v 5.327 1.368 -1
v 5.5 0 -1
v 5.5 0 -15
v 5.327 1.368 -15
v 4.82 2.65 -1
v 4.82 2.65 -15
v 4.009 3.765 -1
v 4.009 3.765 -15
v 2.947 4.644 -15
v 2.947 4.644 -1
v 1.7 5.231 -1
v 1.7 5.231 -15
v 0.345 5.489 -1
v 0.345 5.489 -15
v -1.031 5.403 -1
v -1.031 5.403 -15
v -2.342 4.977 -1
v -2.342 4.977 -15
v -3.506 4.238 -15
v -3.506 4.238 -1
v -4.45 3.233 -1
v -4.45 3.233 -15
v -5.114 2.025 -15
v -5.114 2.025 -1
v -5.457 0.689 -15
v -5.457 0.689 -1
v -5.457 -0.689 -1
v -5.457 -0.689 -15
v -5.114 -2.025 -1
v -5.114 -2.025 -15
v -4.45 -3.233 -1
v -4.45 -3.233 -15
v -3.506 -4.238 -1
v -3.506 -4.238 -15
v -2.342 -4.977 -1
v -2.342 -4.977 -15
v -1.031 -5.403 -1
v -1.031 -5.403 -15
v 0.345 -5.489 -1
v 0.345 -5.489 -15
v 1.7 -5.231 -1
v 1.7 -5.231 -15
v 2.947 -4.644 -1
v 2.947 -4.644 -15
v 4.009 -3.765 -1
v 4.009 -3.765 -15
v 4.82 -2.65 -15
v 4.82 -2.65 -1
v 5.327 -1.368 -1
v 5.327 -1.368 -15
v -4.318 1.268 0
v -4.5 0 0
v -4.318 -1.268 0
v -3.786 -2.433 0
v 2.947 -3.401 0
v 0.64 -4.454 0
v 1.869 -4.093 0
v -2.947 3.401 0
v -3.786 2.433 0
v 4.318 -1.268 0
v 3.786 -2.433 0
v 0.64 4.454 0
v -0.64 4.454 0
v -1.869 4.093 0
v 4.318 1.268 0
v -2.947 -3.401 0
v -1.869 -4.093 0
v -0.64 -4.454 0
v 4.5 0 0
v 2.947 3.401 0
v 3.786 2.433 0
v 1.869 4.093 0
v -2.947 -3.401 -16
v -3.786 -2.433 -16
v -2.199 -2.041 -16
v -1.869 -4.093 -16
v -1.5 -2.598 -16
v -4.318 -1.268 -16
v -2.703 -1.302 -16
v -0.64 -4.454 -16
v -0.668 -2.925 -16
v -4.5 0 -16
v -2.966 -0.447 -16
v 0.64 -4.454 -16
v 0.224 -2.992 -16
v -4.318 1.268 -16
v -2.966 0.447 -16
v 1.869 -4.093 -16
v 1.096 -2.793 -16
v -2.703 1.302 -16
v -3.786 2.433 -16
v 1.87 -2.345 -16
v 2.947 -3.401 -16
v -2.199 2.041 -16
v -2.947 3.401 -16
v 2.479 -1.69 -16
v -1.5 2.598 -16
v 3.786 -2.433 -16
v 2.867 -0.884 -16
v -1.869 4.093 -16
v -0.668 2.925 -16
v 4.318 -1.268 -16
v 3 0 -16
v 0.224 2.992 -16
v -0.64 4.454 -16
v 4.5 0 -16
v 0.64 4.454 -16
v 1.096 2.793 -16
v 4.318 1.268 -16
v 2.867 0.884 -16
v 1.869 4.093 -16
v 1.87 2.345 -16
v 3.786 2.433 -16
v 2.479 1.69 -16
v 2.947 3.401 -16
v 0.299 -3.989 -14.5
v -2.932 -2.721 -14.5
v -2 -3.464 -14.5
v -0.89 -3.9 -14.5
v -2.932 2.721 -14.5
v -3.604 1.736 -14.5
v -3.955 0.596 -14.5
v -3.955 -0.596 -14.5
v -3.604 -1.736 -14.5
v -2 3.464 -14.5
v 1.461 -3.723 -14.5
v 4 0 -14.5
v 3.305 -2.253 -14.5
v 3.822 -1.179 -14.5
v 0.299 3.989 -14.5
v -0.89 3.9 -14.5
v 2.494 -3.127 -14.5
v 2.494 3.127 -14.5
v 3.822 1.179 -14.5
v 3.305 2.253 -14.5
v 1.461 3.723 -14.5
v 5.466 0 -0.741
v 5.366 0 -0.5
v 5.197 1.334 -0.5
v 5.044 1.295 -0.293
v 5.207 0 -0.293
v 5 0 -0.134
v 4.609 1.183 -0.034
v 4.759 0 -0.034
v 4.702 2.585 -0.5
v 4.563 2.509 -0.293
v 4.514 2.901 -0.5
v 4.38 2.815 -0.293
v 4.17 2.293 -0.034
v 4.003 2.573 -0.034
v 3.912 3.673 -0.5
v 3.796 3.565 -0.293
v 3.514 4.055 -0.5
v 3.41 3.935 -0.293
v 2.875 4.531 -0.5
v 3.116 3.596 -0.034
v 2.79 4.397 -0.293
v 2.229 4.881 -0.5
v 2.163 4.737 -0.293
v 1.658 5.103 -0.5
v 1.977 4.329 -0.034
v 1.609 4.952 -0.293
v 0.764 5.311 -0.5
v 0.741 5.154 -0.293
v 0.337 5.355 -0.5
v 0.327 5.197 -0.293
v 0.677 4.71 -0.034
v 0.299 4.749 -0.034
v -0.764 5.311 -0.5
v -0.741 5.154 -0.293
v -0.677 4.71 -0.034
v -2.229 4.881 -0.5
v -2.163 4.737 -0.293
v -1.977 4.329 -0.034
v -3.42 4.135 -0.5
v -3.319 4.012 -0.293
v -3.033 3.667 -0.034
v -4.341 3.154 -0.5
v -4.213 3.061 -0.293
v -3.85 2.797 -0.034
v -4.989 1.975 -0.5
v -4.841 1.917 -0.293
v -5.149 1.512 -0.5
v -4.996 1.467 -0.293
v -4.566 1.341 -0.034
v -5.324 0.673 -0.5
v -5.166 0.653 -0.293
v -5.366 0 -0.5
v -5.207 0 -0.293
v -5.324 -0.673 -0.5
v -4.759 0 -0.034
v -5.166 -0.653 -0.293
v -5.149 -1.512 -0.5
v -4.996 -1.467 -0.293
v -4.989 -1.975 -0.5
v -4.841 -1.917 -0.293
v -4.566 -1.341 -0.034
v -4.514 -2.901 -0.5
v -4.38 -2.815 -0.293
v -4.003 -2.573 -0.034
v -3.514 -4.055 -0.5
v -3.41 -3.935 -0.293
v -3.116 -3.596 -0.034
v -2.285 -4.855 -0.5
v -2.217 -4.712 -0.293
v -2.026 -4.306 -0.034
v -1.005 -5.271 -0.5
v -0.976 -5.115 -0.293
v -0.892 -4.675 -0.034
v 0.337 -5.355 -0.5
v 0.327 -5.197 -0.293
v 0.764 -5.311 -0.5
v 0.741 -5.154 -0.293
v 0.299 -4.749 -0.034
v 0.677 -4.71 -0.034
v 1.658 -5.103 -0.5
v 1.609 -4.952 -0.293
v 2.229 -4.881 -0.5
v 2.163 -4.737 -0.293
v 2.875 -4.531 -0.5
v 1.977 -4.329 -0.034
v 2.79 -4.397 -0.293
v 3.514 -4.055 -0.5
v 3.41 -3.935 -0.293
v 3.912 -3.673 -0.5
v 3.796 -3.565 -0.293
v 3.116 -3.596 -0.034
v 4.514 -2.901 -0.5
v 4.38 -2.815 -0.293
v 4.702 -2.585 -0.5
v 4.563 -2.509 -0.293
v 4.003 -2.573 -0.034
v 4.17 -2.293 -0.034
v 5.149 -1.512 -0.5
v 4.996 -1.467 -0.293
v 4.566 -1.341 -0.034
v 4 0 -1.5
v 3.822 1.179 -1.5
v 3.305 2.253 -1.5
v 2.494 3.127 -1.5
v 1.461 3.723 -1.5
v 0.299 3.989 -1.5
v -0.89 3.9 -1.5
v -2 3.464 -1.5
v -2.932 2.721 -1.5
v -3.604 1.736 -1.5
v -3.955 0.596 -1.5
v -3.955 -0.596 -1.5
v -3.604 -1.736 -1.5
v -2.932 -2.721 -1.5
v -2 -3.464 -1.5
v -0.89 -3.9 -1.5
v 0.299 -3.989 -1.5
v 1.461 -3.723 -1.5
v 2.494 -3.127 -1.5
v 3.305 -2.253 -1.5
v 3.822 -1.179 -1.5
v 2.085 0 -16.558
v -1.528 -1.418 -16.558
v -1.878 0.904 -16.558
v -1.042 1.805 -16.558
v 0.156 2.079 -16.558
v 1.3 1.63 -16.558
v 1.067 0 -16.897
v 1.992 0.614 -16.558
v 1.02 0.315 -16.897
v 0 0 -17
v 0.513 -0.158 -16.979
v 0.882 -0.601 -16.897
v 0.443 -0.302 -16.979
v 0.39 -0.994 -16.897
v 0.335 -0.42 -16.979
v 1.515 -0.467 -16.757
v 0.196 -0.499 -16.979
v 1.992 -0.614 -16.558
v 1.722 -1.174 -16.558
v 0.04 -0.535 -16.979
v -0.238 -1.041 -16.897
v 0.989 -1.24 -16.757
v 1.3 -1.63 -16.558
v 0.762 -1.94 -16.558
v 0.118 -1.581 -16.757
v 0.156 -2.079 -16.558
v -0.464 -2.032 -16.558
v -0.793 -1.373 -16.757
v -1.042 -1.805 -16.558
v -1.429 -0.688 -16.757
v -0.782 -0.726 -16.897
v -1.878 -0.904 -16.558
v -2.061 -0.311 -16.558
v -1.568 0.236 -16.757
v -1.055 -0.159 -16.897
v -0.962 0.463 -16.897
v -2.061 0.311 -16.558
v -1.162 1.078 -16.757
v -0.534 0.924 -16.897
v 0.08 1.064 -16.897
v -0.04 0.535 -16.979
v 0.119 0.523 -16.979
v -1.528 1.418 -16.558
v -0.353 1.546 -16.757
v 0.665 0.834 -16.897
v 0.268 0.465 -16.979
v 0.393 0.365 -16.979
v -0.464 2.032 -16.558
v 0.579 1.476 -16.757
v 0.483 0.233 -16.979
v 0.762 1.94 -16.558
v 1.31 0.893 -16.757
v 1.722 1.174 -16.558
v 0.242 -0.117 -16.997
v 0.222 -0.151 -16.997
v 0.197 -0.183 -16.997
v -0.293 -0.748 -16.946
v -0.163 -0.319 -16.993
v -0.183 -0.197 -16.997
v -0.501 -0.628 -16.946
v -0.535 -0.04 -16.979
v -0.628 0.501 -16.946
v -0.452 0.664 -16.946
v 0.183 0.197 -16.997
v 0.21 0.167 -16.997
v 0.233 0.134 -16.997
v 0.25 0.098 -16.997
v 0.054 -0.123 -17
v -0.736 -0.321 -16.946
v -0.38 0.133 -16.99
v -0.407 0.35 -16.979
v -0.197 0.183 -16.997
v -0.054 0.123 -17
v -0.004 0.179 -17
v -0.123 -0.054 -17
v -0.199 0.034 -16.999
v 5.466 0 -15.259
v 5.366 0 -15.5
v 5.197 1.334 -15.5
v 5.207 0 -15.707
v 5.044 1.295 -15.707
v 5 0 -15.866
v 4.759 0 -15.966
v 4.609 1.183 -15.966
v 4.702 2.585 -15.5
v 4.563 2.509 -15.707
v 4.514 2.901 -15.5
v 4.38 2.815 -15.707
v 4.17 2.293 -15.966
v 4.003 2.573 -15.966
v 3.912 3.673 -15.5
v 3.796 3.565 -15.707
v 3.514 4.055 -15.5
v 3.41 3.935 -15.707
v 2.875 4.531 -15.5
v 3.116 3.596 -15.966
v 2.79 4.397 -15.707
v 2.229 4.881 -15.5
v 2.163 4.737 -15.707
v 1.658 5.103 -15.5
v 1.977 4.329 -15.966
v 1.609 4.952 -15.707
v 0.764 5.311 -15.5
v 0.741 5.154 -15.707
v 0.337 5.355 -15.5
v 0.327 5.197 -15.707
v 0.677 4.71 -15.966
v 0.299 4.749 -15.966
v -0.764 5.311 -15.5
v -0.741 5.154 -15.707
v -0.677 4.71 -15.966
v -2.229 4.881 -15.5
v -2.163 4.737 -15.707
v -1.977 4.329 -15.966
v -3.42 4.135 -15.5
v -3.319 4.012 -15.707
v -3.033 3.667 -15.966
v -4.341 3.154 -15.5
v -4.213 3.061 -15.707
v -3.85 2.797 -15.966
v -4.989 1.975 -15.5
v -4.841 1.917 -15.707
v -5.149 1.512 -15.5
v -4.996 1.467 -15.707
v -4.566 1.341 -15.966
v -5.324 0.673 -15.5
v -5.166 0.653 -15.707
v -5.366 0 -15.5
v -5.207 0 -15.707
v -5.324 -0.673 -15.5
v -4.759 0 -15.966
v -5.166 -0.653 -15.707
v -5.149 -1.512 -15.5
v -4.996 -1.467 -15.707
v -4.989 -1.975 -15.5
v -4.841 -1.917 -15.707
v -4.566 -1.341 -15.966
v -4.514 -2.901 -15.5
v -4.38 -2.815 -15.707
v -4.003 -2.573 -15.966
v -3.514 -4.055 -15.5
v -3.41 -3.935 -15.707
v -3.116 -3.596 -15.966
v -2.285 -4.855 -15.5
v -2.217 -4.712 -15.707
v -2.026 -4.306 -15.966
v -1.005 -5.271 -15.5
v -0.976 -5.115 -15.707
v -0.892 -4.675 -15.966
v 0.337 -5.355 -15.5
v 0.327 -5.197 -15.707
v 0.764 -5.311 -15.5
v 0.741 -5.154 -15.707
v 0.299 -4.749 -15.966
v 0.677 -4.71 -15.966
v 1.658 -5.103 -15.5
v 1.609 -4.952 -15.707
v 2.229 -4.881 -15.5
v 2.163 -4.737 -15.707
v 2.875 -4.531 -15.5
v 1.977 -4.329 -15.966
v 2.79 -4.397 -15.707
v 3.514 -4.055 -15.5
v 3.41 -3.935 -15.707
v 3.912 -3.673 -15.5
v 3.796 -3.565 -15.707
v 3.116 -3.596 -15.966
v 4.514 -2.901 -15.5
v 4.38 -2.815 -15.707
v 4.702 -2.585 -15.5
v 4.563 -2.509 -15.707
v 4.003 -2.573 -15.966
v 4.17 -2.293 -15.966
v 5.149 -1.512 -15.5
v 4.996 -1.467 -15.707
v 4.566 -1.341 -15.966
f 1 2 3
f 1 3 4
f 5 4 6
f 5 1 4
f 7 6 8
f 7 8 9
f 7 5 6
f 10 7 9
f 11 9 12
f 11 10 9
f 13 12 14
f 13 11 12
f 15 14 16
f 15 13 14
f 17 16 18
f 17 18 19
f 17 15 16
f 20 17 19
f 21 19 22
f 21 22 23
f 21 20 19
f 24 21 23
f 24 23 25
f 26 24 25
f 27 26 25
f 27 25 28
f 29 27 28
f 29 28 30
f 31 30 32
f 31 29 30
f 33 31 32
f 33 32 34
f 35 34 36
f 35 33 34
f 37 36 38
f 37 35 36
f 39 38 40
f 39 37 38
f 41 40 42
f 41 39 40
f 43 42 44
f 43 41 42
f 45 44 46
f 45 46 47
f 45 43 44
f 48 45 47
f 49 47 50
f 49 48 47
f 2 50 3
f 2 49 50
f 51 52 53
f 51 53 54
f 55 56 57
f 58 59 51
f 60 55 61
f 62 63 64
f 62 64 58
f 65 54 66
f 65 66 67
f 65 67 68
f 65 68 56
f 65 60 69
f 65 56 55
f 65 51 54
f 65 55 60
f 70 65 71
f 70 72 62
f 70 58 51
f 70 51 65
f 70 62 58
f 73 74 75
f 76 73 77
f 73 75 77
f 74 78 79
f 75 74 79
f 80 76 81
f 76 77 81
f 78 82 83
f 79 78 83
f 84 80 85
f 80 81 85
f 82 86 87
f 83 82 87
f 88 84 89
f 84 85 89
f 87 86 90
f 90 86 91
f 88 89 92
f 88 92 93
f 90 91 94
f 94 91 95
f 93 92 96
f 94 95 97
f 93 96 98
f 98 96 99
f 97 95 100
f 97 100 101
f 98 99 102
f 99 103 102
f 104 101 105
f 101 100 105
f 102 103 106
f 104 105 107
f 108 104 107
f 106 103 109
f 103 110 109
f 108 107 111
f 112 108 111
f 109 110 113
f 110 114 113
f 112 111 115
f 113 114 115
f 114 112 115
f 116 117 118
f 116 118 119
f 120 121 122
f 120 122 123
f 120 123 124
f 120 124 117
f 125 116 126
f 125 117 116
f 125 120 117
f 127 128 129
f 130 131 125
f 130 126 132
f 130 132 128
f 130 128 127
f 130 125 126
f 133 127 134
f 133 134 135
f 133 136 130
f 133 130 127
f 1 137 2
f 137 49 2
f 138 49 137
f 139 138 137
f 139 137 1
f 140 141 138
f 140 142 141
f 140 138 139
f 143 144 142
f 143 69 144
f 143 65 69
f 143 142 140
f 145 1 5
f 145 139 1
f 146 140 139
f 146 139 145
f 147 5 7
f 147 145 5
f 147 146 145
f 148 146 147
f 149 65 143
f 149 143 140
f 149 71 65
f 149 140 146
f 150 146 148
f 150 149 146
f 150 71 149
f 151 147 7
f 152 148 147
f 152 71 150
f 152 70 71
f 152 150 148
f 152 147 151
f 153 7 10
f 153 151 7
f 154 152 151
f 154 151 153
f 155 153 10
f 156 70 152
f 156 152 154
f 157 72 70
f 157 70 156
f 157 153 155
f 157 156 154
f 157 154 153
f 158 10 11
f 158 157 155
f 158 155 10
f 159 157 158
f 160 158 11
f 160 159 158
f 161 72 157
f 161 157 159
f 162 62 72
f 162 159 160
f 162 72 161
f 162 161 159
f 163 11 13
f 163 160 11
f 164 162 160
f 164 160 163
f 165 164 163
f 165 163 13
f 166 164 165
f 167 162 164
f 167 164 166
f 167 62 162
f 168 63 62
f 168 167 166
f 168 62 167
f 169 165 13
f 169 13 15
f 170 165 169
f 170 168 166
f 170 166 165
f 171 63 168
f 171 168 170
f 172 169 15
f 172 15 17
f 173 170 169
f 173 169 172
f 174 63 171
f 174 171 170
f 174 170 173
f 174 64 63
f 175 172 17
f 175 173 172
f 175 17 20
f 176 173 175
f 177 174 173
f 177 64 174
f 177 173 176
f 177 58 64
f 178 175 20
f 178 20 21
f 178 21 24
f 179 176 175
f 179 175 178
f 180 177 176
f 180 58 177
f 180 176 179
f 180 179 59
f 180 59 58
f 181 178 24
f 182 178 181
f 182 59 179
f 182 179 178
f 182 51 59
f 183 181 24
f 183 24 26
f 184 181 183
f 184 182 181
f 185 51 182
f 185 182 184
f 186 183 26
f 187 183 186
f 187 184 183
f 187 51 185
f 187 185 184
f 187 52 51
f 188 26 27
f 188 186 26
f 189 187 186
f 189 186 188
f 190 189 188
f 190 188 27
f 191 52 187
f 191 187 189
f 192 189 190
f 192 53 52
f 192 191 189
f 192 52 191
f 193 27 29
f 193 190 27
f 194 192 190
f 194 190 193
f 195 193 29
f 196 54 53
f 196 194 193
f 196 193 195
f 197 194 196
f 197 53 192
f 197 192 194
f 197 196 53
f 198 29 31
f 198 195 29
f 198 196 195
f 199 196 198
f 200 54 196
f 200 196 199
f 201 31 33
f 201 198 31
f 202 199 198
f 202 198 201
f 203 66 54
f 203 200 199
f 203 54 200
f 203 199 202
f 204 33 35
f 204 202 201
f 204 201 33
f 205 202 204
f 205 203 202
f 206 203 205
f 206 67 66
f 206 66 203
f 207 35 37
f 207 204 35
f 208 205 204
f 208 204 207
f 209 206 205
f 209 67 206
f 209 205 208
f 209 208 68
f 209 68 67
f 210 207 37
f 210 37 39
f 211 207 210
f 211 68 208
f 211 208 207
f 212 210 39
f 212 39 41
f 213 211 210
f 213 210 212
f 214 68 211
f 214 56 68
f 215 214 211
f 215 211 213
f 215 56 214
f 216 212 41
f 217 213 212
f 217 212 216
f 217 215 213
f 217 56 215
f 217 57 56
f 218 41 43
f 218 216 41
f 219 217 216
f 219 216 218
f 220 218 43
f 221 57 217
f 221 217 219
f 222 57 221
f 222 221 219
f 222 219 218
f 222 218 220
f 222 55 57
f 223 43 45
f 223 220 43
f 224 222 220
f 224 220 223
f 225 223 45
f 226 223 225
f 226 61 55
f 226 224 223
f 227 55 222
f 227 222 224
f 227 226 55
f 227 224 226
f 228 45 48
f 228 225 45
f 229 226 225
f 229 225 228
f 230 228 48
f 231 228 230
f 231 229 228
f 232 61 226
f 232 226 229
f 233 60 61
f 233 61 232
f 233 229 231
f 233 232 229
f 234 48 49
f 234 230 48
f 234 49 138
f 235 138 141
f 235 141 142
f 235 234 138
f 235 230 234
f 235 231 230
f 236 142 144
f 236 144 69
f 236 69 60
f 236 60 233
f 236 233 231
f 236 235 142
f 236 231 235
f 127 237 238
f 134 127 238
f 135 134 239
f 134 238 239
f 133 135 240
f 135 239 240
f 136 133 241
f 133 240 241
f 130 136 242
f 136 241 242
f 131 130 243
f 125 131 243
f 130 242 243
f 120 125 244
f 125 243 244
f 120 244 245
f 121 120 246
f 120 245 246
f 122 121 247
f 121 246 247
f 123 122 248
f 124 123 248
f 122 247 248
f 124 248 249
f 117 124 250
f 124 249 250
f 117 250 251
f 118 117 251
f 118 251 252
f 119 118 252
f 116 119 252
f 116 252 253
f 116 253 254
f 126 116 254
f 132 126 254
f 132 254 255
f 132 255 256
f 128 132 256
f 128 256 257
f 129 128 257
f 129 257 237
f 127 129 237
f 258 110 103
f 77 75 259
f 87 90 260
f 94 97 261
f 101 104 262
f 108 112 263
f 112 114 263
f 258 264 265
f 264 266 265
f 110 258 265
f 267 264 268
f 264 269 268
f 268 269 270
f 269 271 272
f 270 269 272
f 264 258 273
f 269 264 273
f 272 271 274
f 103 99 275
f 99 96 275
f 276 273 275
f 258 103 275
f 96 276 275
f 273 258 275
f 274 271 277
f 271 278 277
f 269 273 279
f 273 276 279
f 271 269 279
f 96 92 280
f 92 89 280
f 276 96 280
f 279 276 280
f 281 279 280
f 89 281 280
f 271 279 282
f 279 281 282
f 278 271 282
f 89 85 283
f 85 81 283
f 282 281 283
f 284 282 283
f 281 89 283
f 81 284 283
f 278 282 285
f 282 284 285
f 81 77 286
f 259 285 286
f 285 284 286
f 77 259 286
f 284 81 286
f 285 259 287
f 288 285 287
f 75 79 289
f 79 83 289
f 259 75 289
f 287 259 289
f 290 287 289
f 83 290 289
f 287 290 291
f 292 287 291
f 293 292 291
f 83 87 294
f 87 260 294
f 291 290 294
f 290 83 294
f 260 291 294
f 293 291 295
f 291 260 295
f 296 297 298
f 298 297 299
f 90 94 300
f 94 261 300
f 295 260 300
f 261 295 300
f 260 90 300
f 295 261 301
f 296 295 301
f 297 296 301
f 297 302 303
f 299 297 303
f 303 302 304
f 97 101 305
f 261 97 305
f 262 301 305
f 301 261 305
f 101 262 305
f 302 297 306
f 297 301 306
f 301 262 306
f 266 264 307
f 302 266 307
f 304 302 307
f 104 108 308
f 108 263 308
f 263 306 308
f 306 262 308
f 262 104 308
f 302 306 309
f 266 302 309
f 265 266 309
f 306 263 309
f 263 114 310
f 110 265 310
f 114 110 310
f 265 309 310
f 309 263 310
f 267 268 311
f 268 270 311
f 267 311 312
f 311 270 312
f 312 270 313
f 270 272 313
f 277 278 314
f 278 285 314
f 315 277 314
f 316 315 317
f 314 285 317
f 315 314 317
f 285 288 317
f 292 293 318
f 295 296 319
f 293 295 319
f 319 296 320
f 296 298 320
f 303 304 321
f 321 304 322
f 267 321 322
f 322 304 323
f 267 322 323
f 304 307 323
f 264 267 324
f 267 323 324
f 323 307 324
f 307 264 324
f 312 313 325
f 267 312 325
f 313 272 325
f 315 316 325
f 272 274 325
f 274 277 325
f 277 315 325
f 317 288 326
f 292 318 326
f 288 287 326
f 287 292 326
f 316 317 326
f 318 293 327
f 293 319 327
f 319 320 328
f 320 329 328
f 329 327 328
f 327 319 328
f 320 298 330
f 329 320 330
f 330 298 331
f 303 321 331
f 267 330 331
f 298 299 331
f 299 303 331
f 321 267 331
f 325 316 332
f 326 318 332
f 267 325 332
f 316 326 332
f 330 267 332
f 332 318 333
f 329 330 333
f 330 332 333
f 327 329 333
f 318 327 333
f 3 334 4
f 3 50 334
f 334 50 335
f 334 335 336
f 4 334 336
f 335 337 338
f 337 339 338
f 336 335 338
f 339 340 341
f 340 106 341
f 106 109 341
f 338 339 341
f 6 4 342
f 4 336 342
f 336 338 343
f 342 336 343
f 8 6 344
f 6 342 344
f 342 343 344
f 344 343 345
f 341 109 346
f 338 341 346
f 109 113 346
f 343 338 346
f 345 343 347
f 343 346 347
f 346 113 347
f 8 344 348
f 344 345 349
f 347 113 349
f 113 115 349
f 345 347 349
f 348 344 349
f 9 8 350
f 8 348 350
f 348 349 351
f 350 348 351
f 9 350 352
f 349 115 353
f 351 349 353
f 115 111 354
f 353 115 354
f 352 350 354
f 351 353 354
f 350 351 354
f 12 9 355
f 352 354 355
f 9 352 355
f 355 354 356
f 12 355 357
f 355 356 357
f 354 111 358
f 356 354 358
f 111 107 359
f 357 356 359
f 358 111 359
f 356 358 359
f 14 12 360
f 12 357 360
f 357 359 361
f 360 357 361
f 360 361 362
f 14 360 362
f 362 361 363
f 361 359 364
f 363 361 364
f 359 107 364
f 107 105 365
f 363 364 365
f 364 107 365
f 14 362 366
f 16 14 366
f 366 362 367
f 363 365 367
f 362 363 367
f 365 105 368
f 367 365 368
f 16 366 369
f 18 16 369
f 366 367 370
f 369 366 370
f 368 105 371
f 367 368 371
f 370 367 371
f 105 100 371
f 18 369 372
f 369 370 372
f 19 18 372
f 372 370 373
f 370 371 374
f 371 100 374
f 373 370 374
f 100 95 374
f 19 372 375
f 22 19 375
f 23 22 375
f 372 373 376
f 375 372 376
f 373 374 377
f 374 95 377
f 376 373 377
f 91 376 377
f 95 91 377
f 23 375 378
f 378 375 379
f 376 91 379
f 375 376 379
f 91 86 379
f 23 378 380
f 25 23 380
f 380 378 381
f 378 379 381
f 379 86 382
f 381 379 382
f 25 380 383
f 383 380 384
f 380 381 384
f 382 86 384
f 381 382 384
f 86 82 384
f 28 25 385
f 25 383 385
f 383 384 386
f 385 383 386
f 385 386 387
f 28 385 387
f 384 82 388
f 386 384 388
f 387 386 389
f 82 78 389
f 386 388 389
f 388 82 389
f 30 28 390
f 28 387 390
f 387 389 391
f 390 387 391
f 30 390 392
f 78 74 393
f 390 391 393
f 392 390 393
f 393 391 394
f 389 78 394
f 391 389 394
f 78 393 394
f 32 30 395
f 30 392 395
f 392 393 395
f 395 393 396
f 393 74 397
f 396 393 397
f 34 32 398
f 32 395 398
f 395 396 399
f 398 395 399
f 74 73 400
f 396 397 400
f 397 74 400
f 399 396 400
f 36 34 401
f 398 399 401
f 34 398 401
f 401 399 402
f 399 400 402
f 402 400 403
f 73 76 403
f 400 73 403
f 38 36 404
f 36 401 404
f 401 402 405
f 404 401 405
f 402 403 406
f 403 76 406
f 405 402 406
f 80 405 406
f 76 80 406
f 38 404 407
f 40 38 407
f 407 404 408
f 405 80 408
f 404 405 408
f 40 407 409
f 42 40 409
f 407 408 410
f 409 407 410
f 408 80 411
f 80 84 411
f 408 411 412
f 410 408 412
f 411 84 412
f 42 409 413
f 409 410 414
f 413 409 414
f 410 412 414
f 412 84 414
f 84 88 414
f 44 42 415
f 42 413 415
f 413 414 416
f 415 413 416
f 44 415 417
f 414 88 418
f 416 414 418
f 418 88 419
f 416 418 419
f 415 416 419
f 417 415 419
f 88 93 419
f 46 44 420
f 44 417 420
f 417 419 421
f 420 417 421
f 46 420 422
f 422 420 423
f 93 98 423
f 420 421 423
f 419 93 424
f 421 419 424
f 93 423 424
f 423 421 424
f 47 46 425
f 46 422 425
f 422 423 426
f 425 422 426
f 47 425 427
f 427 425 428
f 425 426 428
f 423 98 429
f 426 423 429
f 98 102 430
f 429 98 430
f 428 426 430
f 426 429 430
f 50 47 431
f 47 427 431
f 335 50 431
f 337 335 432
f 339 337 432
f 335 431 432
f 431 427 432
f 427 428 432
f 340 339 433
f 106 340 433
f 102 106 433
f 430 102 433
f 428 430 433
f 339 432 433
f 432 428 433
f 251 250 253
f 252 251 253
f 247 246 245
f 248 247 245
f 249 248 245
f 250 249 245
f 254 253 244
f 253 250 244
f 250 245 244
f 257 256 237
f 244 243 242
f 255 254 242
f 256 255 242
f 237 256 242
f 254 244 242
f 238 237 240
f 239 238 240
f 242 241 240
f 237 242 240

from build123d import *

# Parameters (mm, degrees)
F0_R     = 5.5
F1_DEPTH = 16
F2_R     = 1
F3_T     = -1.5
F6_R     = 1


with BuildPart() as f1:
    # F0 (on Top) → F1 (new body)
    with BuildSketch(Plane.XY):
        Circle(F0_R)
    extrude(amount=-F1_DEPTH)

    # F2
    f2_edges = [f1.edges().sort_by_distance(p)[0] for p in [
        (-5.5, 0, -16),
    ]]
    fillet(f2_edges, radius=F2_R)

    # F3 (hollow: no face is removed)
    offset(amount=F3_T, mode=Mode.SUBTRACT)

    # F4 (on Front) → F5 (revolve)
    with BuildSketch(Plane.XZ):
        with BuildLine():
            Line((3, -16), (0, -16))
            Line((0, -16), (0, -17))
            ThreePointArc((0, -17), (1.5855322487, -16.7565967462), (3, -16))
        make_face()
    revolve(axis=Axis((0, 0, -16.5), (0, 0, -1)))

    # F6
    f6_edges = [f1.edges().sort_by_distance(p)[0] for p in [
        (-5.5, 0, 0),
    ]]
    fillet(f6_edges, radius=F6_R)


solid = f1.part
